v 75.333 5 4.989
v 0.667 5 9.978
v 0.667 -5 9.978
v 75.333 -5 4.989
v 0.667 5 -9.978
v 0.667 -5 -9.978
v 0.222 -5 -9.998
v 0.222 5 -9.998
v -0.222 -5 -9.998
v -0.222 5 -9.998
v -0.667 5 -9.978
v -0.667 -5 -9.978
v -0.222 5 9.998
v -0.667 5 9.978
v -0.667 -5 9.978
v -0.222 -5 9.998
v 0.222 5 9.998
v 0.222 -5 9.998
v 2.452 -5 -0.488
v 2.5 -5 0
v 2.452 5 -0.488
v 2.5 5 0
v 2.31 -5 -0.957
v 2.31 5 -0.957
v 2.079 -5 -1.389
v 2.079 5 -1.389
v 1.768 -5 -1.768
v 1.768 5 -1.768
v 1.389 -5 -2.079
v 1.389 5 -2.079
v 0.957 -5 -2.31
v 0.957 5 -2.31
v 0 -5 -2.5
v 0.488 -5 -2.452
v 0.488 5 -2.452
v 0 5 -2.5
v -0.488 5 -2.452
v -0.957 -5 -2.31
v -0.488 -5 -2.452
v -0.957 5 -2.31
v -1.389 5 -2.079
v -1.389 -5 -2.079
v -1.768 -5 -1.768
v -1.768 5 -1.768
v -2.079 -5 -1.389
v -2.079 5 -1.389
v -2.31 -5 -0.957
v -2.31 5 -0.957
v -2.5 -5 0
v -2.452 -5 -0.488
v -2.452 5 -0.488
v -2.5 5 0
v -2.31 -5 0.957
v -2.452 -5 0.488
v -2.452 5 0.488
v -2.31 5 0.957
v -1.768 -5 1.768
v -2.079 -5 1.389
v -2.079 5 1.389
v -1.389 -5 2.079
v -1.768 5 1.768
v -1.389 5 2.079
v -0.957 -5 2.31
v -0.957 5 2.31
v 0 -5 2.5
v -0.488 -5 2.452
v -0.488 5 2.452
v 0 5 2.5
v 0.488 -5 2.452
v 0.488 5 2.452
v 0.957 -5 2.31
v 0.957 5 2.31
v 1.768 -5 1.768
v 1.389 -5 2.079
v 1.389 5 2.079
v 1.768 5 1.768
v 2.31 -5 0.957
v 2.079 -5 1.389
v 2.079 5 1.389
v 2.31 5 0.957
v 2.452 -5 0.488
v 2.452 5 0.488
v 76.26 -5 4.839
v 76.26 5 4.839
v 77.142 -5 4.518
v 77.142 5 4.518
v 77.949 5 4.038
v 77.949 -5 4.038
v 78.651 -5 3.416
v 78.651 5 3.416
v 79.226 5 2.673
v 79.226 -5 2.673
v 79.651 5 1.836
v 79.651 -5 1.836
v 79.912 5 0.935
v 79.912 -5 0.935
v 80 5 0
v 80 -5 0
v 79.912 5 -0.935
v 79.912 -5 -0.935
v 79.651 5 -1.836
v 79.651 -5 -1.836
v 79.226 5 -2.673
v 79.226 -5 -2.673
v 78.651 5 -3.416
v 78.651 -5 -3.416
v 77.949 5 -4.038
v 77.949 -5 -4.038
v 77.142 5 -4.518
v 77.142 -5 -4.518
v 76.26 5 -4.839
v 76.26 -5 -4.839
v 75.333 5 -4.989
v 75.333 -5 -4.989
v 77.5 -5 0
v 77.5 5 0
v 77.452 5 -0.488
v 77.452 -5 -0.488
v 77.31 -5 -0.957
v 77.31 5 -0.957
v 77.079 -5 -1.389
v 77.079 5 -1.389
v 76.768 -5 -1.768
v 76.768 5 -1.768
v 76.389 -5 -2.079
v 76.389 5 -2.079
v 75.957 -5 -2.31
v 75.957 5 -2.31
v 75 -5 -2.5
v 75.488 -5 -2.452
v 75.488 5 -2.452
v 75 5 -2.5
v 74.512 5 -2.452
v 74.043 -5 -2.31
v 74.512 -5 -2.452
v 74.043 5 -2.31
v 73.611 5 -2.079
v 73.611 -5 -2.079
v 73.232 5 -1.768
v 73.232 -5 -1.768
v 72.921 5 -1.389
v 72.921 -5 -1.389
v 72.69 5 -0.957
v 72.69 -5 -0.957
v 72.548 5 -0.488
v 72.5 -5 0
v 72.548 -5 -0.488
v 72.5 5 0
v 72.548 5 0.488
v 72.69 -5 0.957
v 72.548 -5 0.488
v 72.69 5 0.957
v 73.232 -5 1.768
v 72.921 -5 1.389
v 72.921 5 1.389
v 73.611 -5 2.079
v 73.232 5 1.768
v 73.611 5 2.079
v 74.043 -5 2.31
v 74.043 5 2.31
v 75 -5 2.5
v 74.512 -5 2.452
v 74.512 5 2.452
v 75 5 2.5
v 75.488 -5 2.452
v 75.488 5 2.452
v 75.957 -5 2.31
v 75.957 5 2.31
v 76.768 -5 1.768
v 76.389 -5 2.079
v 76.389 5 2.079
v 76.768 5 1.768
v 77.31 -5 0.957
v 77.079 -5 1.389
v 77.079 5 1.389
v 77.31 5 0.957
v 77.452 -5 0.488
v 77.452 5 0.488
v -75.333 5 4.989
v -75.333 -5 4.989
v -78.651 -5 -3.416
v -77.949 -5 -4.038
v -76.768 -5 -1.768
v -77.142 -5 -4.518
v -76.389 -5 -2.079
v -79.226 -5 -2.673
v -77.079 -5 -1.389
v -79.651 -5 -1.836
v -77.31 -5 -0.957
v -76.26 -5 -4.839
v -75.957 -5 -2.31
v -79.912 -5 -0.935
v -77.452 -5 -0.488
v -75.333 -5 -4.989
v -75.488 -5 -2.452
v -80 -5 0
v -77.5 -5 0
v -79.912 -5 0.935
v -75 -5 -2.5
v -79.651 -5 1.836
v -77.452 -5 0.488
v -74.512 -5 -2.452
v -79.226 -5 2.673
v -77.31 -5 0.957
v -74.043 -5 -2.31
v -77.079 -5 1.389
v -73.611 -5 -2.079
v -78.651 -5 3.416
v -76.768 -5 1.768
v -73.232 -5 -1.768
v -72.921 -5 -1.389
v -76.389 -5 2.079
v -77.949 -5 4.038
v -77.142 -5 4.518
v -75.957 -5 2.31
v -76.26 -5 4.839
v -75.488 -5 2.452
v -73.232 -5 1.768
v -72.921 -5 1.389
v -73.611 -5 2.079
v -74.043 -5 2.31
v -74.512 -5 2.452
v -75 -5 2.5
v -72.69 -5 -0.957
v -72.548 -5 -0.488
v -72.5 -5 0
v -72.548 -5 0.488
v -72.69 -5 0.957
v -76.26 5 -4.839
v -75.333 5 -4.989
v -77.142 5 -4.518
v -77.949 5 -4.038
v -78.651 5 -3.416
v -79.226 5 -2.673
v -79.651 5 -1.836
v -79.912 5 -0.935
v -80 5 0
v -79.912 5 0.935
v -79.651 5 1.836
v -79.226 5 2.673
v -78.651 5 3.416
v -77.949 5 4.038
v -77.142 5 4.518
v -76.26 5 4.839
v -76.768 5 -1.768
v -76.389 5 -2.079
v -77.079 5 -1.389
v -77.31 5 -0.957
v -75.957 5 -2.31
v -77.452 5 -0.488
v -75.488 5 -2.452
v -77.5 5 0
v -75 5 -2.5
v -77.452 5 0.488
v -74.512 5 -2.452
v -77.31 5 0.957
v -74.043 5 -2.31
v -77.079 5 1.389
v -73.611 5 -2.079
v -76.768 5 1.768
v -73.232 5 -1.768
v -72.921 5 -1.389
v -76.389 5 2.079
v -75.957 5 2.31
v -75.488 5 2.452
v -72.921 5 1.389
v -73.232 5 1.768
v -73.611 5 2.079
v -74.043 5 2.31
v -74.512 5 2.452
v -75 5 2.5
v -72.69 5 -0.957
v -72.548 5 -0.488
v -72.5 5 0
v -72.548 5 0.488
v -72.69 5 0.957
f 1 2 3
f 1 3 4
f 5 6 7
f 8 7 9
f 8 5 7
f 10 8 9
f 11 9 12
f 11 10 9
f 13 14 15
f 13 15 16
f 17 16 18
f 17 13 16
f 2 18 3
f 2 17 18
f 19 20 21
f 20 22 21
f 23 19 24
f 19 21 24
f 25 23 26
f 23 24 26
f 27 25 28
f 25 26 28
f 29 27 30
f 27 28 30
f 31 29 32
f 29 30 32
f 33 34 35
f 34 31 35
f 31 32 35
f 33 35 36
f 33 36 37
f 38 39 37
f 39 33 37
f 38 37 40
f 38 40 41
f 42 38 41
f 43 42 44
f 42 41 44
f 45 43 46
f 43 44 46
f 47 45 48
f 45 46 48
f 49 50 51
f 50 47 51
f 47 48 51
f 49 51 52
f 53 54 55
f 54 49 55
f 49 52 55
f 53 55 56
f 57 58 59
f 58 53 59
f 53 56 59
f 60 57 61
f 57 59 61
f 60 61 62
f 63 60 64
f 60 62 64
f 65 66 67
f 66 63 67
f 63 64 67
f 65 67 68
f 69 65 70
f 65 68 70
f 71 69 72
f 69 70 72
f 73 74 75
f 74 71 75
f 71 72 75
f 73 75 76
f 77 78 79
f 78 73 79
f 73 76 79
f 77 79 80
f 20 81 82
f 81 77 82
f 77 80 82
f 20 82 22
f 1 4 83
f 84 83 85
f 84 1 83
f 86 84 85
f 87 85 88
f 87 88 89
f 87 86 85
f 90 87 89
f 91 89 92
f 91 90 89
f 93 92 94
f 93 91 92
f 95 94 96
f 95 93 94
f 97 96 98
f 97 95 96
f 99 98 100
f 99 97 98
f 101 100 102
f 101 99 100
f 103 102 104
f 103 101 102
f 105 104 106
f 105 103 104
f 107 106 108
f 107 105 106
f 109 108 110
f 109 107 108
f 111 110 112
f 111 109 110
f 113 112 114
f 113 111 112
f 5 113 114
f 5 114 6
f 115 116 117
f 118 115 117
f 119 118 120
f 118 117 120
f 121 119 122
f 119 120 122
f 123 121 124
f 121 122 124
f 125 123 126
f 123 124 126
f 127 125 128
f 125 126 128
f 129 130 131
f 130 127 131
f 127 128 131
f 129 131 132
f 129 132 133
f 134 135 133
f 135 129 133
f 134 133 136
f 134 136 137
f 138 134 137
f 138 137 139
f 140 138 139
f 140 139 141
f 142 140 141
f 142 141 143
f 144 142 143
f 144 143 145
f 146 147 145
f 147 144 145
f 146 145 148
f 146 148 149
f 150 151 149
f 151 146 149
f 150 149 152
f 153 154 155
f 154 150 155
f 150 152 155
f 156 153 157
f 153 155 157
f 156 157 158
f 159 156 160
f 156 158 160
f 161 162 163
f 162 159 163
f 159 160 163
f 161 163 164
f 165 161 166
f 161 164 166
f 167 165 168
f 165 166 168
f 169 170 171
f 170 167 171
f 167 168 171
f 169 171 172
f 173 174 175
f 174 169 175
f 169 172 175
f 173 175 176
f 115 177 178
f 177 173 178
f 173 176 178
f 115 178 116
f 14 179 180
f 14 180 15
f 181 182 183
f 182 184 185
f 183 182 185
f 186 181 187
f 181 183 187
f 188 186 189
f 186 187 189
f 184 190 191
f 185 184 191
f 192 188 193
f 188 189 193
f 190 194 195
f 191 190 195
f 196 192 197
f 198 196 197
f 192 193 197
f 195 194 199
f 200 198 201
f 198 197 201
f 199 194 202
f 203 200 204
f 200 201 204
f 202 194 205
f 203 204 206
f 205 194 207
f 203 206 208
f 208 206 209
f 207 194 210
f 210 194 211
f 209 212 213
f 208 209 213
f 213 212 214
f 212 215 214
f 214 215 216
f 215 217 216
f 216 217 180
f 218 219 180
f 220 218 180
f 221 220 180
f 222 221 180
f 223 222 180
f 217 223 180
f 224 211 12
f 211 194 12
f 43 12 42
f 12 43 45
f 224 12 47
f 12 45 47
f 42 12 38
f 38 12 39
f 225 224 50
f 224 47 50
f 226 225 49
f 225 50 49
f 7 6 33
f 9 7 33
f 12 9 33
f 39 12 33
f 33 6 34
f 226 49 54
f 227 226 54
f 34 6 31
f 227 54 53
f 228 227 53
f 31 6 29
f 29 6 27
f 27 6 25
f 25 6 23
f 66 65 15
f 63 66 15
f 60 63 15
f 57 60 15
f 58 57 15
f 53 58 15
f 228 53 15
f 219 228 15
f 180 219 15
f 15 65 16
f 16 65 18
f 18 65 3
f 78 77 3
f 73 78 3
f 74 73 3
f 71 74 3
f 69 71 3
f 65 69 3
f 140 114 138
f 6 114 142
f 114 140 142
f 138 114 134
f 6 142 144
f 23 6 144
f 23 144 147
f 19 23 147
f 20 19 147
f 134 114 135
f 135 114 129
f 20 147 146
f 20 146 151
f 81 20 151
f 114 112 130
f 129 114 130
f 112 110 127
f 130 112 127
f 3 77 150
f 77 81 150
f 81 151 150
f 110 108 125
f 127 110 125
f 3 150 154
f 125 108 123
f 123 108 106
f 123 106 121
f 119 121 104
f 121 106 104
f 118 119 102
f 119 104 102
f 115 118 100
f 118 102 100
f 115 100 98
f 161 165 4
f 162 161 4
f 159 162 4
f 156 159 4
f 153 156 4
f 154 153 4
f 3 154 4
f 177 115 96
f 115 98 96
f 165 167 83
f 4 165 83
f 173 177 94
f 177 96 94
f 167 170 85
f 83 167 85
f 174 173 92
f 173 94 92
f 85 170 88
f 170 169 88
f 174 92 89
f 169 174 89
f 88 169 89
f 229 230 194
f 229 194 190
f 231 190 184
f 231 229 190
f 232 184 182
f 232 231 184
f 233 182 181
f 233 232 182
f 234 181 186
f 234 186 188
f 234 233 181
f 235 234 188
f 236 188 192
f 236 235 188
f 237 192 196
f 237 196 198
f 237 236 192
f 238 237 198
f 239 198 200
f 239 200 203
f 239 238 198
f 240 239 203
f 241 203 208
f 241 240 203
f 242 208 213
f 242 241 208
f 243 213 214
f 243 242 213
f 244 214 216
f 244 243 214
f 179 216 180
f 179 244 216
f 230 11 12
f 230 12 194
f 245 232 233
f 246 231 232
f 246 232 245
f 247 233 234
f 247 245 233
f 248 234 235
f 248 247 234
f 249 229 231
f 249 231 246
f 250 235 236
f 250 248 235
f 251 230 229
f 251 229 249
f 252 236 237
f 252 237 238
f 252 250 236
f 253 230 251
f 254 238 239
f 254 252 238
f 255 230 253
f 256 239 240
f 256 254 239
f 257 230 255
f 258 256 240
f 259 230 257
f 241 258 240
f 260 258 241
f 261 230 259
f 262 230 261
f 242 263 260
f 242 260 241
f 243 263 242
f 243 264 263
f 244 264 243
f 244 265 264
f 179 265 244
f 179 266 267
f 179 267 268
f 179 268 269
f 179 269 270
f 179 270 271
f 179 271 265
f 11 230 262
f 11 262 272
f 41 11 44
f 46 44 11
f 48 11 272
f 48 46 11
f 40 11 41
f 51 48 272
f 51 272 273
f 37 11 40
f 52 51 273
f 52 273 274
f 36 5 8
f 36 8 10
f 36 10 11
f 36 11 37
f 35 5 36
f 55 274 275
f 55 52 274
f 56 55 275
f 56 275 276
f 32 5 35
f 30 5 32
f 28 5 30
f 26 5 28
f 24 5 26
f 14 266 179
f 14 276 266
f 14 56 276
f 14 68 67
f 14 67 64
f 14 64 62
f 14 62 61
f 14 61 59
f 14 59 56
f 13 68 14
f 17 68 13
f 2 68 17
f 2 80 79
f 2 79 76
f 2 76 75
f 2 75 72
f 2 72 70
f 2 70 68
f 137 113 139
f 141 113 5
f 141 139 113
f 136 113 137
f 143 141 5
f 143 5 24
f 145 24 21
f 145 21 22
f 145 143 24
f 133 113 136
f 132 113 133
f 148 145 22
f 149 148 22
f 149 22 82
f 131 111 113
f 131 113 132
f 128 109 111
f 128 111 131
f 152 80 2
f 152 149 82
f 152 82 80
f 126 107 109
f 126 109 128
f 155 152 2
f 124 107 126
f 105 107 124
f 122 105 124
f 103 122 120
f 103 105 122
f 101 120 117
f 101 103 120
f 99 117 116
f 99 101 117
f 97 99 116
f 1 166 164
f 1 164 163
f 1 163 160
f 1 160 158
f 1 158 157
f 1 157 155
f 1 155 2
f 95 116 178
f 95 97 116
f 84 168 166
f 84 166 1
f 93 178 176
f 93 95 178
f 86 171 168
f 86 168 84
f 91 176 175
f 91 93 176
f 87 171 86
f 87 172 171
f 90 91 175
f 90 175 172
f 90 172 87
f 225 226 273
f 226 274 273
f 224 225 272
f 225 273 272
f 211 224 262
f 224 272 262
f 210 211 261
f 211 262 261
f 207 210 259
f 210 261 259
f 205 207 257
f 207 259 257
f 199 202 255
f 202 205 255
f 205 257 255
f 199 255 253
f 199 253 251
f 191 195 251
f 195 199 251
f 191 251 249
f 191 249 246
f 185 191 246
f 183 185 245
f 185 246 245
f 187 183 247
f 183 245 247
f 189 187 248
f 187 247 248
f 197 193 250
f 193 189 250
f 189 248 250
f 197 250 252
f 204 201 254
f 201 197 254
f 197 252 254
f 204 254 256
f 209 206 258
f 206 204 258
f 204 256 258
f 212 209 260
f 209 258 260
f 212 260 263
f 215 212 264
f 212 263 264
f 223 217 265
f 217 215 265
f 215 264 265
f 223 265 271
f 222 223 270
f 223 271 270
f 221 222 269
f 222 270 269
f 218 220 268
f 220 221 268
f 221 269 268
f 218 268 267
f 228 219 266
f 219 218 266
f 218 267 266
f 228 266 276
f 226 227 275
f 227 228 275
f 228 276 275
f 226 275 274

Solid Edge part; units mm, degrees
sketch "Sketch1" plane through (0, 0, 0) normal (0, -1, 0) x (1, 0, 0)
  circle A0 centre (75, 0) radius 2.5
  line L0 (-75.3333, 4.9889) -> (-0.6667, 9.9778)
  line L1 (0.6667, 9.9778) -> (75.3333, 4.9889)
  line L2 (75.3333, -4.9889) -> (0.6667, -9.9778)
  arc A1 (0.6667, -9.9778) -> (-0.6667, -9.9778) centre (0, 0) cw
  line L3 (-0.6667, -9.9778) -> (-75.3333, -4.9889)
  arc A2 (-75.3333, -4.9889) -> (-75.3333, 4.9889) centre (-75, 0) cw
  arc A3 (-0.6667, 9.9778) -> (0.6667, 9.9778) centre (0, 0) cw
  arc A4 (75.3333, 4.9889) -> (75.3333, -4.9889) centre (75, 0) cw
  circle A5 centre (0, 0) radius 2.5
  circle A6 centre (-75, 0) radius 2.5
extrude "Protrusion1" add sketch "Sketch1" along normal mid plane 10
